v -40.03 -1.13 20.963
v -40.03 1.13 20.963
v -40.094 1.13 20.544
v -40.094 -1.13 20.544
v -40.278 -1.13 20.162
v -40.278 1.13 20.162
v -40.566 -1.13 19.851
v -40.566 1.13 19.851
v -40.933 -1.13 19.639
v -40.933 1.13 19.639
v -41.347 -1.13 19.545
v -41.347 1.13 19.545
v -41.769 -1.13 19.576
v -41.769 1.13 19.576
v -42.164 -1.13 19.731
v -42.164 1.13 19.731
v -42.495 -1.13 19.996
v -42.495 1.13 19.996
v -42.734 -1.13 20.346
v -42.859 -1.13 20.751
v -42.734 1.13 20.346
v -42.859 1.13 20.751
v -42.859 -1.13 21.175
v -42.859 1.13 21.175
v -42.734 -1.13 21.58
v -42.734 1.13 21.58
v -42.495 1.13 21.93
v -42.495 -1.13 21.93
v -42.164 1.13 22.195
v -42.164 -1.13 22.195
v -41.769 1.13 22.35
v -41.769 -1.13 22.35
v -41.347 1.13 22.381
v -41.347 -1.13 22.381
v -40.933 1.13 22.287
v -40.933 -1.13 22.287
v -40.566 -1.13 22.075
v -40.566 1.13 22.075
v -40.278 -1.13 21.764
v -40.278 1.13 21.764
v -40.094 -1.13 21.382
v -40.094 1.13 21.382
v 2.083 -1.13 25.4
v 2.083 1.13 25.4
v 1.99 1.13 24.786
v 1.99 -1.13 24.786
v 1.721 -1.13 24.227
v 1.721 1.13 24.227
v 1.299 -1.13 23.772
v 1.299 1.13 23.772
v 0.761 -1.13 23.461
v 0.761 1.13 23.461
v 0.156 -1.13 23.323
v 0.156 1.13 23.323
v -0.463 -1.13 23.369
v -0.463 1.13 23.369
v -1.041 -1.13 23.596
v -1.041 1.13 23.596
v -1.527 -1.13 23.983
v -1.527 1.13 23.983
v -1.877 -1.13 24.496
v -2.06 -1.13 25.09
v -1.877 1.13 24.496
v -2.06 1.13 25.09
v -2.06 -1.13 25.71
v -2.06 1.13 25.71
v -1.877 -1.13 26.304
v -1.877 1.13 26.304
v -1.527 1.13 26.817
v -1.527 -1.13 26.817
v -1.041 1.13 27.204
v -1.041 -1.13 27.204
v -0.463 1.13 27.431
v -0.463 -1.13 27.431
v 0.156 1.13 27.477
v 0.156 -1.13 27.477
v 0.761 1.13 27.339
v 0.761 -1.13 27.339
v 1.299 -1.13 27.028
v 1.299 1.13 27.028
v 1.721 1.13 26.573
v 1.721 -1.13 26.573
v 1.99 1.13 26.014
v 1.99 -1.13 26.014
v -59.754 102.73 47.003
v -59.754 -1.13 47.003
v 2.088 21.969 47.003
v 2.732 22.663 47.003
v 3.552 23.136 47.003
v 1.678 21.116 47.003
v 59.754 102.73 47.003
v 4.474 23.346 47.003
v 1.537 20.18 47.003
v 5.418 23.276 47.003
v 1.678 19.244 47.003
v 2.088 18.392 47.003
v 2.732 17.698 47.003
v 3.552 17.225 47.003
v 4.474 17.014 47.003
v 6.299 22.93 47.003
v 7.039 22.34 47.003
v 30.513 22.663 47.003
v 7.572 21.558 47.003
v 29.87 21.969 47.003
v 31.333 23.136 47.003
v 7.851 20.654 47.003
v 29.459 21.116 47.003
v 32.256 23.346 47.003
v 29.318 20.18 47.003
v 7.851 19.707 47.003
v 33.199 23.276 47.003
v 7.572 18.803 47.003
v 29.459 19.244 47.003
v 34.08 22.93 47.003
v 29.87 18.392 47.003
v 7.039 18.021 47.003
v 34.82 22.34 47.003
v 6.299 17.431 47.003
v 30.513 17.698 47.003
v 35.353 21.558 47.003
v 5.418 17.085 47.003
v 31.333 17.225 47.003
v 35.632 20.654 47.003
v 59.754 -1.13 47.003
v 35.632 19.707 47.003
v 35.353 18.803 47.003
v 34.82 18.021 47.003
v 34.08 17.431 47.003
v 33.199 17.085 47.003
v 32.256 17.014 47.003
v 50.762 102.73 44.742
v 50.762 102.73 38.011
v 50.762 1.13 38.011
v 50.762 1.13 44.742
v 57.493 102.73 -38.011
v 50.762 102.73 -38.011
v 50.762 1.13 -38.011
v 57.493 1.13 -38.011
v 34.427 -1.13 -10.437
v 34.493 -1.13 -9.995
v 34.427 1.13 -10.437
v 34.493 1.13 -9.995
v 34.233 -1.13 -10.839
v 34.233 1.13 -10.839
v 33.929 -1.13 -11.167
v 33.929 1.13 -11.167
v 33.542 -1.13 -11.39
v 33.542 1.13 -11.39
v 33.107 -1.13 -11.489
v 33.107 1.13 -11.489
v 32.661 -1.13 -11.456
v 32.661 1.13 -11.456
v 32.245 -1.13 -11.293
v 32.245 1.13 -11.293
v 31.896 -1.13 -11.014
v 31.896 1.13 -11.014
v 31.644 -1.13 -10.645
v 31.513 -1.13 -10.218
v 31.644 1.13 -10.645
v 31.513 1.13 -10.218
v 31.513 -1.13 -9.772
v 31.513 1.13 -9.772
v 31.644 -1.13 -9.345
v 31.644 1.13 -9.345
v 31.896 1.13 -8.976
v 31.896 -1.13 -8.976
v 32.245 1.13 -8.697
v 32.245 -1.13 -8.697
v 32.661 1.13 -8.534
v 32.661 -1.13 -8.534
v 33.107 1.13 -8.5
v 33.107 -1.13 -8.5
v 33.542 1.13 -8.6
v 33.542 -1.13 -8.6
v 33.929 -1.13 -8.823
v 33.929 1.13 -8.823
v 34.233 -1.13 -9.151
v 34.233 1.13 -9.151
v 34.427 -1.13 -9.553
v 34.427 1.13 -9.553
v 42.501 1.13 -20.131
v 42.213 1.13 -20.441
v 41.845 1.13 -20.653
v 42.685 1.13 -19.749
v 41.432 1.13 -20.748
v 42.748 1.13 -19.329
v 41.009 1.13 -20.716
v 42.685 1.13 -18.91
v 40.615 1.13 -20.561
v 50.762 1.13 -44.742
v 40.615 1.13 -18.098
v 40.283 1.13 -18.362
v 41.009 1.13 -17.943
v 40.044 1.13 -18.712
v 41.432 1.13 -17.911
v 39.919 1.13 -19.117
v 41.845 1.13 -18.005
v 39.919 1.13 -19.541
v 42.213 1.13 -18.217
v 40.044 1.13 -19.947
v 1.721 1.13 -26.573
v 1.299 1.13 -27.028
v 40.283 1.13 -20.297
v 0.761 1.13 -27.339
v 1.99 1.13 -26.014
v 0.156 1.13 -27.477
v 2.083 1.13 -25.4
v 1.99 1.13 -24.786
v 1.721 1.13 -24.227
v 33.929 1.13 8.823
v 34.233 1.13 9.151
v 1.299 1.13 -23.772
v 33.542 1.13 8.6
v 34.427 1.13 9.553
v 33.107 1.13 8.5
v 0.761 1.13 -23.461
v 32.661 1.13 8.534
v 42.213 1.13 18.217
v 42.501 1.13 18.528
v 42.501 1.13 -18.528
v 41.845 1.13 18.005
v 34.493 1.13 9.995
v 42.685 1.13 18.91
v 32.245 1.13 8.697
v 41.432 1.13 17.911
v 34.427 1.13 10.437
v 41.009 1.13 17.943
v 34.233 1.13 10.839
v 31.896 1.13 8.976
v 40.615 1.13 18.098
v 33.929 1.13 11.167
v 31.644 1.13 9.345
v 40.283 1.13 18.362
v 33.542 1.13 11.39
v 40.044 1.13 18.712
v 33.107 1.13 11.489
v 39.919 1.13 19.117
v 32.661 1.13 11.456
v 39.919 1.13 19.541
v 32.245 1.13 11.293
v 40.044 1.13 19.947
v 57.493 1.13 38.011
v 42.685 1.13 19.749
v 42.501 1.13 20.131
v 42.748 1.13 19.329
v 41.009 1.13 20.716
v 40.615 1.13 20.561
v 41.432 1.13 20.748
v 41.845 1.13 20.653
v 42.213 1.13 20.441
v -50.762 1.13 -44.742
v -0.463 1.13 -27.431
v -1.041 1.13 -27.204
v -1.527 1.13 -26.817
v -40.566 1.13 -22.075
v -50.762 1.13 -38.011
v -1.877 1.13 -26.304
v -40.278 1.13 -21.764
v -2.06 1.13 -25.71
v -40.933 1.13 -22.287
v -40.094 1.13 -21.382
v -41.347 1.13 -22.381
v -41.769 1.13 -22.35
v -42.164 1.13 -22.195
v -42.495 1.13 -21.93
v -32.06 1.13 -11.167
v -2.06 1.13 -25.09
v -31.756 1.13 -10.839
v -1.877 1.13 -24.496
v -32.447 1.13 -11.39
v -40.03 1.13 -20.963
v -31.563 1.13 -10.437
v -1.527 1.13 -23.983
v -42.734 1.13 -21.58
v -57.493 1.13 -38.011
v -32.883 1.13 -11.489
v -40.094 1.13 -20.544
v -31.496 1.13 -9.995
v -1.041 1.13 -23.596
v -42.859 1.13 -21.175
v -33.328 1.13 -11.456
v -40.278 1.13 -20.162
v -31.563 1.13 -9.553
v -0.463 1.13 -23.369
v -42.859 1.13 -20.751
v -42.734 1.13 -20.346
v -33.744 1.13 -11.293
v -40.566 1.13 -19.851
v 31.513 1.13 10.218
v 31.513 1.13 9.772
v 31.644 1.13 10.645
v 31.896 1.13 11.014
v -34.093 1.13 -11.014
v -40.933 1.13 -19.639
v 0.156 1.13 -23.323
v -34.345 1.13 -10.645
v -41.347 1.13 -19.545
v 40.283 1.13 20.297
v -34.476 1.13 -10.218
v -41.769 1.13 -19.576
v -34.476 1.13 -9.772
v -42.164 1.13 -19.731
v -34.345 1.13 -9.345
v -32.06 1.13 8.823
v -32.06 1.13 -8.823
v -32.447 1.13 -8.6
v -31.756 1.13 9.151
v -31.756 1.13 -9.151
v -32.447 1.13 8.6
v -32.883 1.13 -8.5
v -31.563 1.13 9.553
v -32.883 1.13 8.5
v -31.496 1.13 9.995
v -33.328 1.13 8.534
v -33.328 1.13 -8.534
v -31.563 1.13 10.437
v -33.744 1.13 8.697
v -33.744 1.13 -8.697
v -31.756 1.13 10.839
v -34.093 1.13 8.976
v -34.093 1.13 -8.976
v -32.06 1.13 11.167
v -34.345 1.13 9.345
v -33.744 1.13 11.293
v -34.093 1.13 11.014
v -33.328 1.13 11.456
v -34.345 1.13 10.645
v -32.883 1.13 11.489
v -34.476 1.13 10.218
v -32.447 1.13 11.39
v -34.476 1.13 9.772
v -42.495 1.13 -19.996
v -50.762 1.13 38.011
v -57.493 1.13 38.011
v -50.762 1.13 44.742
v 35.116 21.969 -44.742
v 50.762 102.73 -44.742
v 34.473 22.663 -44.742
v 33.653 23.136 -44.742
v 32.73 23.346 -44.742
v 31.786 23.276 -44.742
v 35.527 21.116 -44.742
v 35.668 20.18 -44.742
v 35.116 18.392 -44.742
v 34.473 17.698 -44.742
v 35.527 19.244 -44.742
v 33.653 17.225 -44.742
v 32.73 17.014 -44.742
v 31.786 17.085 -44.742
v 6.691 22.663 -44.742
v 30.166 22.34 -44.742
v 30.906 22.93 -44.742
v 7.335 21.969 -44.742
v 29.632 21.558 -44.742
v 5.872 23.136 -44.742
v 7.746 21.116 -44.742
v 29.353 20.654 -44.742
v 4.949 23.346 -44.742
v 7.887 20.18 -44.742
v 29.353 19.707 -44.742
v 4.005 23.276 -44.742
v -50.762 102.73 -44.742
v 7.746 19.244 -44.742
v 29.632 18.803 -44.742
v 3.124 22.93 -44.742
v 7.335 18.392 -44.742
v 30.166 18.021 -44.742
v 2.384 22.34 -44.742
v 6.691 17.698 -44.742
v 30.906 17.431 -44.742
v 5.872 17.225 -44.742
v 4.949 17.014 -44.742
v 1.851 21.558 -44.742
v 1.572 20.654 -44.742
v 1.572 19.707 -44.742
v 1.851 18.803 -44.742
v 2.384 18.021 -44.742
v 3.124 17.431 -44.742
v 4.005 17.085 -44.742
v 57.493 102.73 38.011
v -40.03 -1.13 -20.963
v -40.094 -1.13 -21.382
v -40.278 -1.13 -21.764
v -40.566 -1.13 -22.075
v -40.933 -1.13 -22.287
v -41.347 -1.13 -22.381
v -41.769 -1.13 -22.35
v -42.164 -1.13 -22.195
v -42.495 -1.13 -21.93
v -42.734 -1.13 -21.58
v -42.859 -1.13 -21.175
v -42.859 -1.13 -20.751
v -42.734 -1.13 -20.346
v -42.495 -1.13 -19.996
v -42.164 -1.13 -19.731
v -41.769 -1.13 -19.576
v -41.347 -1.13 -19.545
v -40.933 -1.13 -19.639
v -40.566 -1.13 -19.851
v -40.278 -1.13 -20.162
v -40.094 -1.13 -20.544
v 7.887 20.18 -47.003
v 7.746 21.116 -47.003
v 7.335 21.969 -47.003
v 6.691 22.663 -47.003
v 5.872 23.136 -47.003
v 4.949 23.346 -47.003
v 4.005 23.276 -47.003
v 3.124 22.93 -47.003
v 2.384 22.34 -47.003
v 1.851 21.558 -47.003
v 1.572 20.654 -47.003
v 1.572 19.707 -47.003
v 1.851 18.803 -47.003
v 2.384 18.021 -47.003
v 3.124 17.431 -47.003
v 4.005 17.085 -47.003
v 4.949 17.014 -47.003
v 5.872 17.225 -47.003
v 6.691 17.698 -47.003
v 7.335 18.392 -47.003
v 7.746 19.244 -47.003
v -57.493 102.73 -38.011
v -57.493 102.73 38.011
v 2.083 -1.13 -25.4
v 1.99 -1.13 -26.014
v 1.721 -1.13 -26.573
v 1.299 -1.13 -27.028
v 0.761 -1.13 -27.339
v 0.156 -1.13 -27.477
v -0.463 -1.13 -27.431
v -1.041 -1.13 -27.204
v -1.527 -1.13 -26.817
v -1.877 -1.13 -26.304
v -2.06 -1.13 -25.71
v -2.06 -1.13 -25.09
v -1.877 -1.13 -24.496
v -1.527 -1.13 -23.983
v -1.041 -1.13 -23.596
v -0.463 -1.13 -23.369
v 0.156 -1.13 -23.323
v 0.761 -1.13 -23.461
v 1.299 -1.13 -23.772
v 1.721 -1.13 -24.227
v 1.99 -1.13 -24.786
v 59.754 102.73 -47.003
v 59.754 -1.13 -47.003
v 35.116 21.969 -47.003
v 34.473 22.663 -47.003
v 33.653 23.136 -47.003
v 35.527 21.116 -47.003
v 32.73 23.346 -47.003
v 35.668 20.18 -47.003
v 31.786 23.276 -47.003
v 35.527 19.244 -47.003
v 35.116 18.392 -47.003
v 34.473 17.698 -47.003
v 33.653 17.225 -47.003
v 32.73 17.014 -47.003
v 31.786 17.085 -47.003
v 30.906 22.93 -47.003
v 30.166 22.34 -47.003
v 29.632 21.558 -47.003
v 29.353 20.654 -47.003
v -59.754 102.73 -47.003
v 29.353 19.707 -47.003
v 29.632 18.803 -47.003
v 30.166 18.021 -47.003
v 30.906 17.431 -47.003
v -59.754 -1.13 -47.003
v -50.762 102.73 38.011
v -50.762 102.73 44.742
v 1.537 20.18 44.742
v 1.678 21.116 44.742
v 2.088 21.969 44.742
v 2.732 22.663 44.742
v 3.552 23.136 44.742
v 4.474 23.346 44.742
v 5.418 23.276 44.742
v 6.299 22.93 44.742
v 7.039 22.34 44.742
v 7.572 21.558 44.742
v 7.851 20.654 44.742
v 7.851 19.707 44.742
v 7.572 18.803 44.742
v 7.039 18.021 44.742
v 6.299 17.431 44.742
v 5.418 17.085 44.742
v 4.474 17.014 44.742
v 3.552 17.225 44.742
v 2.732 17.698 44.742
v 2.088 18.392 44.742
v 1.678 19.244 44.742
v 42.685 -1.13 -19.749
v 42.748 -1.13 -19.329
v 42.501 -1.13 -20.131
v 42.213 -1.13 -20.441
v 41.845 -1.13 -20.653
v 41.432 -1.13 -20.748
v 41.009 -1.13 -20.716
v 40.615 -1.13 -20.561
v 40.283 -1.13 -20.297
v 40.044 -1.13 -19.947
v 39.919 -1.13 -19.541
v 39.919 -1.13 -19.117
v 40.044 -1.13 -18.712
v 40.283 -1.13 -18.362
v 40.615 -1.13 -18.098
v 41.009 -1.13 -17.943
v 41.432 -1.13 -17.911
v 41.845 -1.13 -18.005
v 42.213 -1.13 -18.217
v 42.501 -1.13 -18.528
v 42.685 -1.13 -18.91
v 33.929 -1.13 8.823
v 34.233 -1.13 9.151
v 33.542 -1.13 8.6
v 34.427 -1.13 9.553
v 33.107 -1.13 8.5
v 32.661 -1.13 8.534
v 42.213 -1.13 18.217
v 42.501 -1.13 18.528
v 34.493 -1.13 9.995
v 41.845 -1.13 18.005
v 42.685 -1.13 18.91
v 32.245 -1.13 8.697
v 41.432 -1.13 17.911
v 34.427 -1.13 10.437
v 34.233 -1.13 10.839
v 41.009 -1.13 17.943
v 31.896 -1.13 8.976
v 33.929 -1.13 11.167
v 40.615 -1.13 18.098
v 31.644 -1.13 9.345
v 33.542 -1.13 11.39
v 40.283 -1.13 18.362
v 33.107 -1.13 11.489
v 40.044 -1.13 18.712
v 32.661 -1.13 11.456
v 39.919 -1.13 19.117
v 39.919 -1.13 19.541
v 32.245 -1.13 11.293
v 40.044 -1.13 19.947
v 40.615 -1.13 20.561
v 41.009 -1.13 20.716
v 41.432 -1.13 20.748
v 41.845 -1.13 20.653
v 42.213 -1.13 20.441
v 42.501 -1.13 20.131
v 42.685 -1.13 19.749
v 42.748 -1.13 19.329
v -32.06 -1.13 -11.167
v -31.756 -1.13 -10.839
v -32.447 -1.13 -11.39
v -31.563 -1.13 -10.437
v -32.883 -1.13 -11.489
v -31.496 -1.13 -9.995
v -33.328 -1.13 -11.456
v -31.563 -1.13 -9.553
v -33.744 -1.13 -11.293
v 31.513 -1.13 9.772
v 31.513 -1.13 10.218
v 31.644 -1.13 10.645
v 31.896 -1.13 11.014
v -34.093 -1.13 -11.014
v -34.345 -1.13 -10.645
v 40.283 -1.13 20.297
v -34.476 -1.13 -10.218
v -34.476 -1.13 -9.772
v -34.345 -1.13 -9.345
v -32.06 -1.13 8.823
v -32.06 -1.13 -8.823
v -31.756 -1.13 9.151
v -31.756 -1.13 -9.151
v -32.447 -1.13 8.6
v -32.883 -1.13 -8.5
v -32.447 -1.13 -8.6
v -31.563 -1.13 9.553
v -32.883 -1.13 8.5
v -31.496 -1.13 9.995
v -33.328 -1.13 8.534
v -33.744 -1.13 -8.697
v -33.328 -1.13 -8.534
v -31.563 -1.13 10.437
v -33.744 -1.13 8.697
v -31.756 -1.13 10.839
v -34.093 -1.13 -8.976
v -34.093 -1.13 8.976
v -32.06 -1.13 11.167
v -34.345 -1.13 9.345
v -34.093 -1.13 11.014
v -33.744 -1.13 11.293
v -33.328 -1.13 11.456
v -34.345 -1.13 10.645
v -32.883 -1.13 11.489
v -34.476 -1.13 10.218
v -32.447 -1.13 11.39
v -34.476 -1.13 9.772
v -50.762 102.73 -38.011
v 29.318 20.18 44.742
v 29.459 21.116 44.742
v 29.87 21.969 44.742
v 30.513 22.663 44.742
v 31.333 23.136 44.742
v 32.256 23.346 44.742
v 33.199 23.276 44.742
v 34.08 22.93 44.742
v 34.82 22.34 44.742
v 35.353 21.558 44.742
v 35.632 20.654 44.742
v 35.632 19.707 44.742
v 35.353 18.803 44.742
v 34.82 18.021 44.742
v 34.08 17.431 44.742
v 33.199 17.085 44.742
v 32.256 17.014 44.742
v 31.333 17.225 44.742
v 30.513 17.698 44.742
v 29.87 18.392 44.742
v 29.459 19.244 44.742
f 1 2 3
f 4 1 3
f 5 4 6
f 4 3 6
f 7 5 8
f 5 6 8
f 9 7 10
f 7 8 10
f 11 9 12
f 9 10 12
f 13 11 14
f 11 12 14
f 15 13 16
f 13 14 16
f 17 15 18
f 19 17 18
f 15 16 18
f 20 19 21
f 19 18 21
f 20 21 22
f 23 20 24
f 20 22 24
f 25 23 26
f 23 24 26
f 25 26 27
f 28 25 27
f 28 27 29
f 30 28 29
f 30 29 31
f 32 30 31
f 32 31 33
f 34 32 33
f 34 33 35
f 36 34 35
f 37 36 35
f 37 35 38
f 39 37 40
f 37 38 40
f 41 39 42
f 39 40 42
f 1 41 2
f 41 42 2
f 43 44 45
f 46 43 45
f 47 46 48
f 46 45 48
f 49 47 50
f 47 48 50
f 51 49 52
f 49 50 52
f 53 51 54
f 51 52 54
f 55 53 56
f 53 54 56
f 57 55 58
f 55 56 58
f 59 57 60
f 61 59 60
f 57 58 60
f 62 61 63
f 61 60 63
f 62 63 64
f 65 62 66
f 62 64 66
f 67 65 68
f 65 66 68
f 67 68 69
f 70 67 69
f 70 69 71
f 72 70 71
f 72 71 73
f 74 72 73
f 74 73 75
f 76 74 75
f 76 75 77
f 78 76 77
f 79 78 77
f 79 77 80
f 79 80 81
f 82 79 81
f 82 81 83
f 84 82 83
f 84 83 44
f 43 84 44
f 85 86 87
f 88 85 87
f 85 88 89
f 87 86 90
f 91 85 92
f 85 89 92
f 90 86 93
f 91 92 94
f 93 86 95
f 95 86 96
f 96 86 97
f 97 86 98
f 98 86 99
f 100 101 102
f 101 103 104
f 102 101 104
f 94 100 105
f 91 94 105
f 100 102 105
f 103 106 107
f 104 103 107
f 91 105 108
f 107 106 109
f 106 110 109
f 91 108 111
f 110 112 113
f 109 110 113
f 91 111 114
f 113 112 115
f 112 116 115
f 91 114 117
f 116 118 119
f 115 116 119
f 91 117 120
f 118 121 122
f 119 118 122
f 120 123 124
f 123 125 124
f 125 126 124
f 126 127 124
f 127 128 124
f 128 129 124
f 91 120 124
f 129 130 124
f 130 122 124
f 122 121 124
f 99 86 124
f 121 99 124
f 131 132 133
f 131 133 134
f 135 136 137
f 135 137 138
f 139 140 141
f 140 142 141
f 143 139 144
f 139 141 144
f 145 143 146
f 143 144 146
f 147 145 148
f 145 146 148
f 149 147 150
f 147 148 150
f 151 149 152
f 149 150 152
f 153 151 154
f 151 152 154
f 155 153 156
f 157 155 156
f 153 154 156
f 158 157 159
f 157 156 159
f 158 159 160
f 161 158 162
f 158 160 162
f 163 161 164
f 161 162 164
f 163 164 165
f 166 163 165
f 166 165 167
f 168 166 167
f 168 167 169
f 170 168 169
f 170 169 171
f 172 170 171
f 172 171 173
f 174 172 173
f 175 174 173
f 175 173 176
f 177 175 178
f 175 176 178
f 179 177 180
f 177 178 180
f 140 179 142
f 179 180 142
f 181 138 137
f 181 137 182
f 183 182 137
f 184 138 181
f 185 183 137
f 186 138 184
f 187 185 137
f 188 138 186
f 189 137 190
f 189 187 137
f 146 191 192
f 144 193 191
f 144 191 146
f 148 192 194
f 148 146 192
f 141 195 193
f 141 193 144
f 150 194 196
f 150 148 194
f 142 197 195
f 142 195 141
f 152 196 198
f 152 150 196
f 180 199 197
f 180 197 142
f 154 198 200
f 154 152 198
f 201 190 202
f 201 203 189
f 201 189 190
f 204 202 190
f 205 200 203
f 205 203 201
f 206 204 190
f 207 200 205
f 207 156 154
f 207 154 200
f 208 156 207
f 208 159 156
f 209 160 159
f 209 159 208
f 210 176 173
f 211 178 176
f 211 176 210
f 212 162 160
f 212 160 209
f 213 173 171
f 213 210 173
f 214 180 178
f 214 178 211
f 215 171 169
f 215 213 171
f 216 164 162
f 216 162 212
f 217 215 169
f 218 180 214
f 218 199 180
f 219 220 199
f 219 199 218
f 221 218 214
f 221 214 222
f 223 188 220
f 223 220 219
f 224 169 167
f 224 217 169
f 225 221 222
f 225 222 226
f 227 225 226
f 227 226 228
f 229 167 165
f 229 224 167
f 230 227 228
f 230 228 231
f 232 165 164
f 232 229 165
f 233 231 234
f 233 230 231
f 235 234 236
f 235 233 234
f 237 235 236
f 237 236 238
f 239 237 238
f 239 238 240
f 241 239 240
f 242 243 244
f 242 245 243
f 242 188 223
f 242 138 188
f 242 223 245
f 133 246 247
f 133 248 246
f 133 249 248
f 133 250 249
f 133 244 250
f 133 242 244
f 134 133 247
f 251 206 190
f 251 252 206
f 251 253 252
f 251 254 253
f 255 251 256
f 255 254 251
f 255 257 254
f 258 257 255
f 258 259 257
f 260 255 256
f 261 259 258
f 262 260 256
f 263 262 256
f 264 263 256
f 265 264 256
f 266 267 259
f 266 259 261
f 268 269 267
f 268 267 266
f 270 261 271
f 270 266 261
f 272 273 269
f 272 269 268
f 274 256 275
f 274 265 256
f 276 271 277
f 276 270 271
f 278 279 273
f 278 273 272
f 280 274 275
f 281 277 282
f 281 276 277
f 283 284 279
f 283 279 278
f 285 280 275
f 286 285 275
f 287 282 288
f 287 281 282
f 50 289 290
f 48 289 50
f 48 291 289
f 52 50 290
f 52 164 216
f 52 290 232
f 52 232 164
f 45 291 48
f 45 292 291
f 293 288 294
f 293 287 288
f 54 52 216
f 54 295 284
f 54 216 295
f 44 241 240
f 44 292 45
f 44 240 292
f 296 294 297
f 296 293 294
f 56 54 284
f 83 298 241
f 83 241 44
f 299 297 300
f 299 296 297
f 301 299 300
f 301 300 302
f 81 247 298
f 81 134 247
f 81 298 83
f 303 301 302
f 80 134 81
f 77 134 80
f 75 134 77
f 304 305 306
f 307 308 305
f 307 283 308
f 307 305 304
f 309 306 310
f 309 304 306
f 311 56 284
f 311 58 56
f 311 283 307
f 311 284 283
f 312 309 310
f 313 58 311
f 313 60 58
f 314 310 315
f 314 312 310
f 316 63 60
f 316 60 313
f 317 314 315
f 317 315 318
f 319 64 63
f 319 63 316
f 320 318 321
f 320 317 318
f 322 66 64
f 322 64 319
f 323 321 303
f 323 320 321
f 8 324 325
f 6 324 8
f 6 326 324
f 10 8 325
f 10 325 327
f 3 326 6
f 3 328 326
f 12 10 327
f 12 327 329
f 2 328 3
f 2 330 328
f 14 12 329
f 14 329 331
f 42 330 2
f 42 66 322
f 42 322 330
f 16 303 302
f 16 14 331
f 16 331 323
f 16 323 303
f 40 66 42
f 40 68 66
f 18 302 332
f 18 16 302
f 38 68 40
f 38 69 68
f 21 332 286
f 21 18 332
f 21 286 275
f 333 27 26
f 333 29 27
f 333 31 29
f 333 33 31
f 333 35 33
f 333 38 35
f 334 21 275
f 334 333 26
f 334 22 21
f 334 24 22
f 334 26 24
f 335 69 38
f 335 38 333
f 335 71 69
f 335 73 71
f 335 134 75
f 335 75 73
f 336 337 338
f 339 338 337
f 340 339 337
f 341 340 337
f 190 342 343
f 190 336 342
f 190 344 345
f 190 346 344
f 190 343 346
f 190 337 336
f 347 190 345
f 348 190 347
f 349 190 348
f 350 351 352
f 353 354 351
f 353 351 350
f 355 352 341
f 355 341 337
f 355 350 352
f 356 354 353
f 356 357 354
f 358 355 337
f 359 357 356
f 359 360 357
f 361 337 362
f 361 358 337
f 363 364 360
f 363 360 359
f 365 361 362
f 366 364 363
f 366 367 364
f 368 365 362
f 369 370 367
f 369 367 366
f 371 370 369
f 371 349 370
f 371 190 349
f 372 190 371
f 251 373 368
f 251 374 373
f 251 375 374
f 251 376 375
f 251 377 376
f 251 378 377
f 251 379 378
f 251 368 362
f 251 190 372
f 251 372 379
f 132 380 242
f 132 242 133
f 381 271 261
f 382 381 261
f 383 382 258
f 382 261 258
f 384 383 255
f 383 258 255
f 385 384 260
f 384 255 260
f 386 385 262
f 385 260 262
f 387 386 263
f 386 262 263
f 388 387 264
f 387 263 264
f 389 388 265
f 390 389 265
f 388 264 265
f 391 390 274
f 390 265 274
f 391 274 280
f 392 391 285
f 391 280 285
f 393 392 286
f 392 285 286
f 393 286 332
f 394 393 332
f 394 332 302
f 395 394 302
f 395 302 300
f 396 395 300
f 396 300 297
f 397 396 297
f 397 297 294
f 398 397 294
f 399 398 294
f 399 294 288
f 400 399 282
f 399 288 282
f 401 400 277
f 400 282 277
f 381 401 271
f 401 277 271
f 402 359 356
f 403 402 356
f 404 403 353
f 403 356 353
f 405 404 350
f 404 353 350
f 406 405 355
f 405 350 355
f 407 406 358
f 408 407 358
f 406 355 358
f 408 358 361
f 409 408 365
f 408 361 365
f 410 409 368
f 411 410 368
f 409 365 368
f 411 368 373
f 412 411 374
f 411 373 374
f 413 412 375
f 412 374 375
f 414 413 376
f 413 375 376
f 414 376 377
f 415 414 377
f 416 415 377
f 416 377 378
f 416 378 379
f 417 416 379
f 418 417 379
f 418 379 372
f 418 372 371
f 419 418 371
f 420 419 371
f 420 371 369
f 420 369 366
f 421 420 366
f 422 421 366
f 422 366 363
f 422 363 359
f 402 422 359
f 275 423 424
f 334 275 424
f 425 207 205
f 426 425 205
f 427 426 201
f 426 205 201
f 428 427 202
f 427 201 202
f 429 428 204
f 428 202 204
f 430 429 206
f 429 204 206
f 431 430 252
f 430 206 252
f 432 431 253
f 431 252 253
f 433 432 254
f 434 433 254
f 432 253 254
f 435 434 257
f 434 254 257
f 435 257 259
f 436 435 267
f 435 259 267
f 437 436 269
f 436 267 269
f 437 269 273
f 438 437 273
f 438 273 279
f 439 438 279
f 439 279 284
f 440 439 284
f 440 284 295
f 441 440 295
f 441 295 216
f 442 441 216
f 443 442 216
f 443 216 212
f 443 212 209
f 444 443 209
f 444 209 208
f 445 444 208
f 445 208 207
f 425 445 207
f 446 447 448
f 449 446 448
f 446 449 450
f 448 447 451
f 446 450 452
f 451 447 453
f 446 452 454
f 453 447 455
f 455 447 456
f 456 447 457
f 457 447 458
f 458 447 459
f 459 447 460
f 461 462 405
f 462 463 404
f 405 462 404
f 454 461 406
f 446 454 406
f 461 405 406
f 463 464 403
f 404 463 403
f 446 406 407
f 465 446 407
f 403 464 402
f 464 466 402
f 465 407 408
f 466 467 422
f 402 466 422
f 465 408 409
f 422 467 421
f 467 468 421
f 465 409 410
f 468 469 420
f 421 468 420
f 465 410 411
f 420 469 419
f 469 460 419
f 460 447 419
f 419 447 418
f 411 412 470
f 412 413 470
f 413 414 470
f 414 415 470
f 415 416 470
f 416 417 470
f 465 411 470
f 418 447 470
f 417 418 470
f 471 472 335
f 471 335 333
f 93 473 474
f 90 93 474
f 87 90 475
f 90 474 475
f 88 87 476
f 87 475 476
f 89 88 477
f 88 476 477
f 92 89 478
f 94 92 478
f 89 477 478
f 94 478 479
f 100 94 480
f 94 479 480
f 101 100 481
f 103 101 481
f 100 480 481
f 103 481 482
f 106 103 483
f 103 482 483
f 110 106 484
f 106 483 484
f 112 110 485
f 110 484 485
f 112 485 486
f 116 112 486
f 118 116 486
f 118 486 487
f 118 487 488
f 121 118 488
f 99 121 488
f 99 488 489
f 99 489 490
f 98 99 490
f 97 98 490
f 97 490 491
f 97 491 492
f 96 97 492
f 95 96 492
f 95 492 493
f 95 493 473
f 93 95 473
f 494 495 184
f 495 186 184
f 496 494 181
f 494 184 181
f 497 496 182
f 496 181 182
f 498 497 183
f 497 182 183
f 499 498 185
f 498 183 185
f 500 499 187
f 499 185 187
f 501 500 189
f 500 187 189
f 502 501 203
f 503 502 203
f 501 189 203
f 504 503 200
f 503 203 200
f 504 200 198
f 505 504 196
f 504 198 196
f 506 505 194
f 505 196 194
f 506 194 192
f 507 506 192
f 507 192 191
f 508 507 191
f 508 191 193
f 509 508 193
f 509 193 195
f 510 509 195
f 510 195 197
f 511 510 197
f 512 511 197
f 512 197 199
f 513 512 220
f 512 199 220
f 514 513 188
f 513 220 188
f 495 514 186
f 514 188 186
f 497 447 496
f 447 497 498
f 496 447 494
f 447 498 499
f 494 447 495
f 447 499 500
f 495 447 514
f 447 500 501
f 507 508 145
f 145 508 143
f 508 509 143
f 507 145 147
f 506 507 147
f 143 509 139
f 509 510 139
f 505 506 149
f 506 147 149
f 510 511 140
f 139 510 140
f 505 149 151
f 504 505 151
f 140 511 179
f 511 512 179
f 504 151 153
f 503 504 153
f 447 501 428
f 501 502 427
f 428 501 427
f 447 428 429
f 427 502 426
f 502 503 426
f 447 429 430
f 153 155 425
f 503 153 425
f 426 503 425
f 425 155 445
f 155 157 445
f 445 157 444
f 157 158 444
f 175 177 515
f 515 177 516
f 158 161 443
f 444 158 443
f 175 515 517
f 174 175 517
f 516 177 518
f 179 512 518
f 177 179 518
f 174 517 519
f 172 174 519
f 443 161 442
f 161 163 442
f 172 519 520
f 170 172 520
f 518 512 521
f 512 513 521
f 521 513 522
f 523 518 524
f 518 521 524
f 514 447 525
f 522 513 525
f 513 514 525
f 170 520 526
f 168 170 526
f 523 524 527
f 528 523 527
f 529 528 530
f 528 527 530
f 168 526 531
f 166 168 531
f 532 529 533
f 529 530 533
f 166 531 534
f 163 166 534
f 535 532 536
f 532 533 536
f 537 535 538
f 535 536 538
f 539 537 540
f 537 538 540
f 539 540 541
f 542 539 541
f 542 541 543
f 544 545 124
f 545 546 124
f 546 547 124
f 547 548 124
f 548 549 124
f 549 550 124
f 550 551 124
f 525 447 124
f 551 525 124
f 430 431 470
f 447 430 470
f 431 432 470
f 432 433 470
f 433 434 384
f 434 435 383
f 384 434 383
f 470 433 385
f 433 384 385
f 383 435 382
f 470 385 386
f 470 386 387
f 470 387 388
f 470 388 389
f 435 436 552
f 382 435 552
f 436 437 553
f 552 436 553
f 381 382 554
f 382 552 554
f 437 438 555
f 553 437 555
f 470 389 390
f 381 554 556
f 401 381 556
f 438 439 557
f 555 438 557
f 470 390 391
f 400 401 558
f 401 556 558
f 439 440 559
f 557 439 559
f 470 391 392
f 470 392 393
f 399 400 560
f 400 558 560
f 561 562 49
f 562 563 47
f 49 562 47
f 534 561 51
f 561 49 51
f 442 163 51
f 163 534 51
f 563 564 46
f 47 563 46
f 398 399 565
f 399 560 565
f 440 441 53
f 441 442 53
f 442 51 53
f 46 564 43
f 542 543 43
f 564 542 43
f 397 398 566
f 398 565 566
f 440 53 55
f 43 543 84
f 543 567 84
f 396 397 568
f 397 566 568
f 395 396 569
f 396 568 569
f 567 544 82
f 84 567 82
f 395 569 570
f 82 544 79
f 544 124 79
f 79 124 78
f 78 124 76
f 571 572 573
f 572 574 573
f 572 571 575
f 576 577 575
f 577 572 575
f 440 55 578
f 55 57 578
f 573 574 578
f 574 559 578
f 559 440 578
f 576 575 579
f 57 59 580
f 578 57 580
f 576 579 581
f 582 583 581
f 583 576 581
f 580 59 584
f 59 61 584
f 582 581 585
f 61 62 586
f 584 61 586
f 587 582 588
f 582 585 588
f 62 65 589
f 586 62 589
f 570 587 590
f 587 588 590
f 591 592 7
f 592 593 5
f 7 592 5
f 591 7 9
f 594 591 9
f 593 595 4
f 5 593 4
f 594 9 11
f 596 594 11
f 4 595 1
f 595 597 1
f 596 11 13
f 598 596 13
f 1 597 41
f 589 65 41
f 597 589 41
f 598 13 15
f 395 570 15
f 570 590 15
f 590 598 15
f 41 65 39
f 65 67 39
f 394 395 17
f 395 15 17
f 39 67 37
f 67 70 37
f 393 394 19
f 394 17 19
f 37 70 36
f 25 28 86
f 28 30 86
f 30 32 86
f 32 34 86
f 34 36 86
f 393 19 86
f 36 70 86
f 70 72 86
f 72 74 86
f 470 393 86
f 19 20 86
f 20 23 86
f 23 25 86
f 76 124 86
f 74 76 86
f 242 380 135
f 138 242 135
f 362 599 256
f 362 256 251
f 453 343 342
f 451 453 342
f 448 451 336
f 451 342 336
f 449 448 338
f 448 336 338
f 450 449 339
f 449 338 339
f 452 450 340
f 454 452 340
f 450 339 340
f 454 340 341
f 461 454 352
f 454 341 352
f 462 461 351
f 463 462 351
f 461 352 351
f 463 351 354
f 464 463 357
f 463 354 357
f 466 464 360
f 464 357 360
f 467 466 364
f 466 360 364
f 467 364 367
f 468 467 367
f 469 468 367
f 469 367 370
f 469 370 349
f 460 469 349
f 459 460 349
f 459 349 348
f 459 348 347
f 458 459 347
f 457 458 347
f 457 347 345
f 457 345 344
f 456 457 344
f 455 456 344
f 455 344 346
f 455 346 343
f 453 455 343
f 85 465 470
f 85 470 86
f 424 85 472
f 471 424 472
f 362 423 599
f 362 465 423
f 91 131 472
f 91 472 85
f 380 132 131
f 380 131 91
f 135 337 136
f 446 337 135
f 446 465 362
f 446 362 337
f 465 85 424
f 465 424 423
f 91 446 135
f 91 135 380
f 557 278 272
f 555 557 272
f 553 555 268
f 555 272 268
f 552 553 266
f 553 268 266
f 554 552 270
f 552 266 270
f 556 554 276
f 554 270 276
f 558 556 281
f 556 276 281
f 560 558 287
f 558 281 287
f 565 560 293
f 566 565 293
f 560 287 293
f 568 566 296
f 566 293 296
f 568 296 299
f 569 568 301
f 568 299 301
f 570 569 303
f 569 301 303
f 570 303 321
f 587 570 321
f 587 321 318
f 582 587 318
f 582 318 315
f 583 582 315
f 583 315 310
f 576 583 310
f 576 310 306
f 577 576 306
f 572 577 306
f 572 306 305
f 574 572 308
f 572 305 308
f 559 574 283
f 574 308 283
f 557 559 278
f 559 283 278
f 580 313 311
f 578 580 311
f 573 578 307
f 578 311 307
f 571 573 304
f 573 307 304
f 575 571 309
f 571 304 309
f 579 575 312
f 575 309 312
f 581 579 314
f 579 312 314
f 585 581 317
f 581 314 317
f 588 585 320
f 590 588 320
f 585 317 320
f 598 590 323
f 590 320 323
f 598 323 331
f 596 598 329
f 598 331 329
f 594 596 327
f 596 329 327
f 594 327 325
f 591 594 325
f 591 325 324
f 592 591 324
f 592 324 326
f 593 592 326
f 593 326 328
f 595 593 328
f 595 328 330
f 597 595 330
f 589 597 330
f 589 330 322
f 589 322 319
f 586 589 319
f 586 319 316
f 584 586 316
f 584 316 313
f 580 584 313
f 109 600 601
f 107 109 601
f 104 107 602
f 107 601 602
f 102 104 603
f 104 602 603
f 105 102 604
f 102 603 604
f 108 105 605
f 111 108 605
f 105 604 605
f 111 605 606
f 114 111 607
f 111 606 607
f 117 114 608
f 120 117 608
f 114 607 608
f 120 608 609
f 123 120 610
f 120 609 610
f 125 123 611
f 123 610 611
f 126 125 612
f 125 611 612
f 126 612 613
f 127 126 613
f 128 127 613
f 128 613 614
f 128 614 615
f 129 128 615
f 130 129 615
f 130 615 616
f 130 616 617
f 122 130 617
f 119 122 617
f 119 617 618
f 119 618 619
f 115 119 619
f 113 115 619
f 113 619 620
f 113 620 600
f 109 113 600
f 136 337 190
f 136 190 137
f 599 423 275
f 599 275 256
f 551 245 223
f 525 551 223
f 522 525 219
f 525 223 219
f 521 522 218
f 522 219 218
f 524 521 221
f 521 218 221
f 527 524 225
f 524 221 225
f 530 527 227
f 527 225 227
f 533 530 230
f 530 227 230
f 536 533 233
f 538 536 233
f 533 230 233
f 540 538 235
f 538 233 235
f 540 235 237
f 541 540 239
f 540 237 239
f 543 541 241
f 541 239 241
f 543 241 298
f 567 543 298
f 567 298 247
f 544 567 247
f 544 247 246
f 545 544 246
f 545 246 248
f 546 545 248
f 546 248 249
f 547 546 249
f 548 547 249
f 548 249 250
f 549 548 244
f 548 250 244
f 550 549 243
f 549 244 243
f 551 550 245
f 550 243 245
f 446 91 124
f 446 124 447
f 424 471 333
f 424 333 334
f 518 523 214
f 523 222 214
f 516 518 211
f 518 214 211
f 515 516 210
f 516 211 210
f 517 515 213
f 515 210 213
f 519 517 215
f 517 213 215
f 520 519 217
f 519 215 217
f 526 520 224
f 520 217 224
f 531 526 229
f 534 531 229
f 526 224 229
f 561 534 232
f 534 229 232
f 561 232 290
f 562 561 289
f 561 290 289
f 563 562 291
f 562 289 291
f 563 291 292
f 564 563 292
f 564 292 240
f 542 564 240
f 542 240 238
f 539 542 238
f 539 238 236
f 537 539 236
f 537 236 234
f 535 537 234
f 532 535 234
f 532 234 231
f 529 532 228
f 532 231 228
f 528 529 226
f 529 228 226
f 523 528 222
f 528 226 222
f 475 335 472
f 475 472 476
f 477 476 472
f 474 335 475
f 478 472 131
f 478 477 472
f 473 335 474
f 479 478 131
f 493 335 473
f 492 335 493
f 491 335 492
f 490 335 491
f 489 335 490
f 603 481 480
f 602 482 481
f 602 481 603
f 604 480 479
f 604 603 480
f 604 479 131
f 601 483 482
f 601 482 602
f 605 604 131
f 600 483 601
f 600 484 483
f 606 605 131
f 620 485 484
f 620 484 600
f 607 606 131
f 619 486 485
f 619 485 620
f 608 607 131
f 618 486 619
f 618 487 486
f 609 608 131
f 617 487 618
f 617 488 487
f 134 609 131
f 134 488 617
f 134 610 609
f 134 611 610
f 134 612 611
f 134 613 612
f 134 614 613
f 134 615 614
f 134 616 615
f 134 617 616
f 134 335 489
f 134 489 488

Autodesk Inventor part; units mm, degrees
ref_plane "YZ Plane" through (0, 0, 0) normal (1, 0, 0) x (0, 1, 0)
ref_plane "XZ Plane" through (0, 0, 0) normal (0, 1, 0) x (-1, 0, 0)
ref_plane "XY Plane" through (0, 0, 0) normal (0, 0, 1) x (1, 0, 0)
sketch "Sketch1" plane through (0, 0, 0) normal (0, 1, 0) x (-1, 0, 0)
  line L0 (-59.7535, -47.0027) -> (59.7535, -47.0027)
  line L1 (59.7535, -47.0027) -> (59.7535, 47.0027)
  line L2 (59.7535, 47.0027) -> (-59.7535, 47.0027)
  line L3 (-59.7535, 47.0027) -> (-59.7535, -47.0027)
  line L4 (-59.7535, -47.0027) -> (59.7535, 47.0027) construction
  line L5 (59.7535, -47.0027) -> (-59.7535, 47.0027) construction
  point P0 (0, 0)
  dimension "d0" = 119.507
  dimension "d1" = 94.0054
extrude "Extrusion1" add sketch "Sketch1" along normal mid plane 2.2606
sketch "Sketch2" plane through (0, 1.1303, 0) normal (0, 1, 0) x (1, 0, 0)
  line L0 (-59.7535, 47.0027) -> (-59.7535, -47.0027) projected
  line L1 (59.7535, -47.0027) -> (59.7535, 47.0027) projected
  line L2 (-59.7535, -47.0027) -> (59.7535, -47.0027)
  line L3 (59.7535, -47.0027) -> (59.7535, 47.0027)
  line L4 (59.7535, 47.0027) -> (-59.7535, 47.0027)
  line L5 (-59.7535, 47.0027) -> (-59.7535, -47.0027)
  line L6 (57.4929, -44.7421) -> (-57.4929, 44.7421) construction
  line L7 (-57.4929, -44.7421) -> (57.4929, 44.7421) construction
  line L8 (-59.7535, -47.0027) -> (59.7535, -47.0027) projected
  line L9 (-59.7535, -47.0027) -> (-50.7619, -47.0027)
  line L10 (-59.7535, -38.0111) -> (-59.7535, -47.0027)
  line L11 (-59.7535, 47.0027) -> (-50.7619, 47.0027)
  line L12 (-59.7535, 38.0111) -> (-59.7535, 47.0027)
  line L13 (59.7535, 47.0027) -> (-59.7535, 47.0027) projected
  line L14 (59.7535, 47.0027) -> (50.7619, 47.0027)
  line L15 (59.7535, 38.0111) -> (59.7535, 47.0027)
  line L16 (59.7535, -47.0027) -> (50.7619, -47.0027)
  line L17 (59.7535, -38.0111) -> (59.7535, -47.0027)
  line L18 (-50.7619, -44.7421) -> (-50.7619, -38.0111)
  line L19 (-50.7619, -38.0111) -> (-57.4929, -38.0111)
  line L20 (-57.4929, 38.0111) -> (-50.7619, 38.0111)
  line L21 (-50.7619, 38.0111) -> (-50.7619, 44.7421)
  line L22 (50.7619, 38.0111) -> (57.4929, 38.0111)
  line L23 (50.7619, 44.7421) -> (50.7619, 38.0111)
  line L24 (57.4929, -38.0111) -> (50.7619, -38.0111)
  line L25 (50.7619, -38.0111) -> (50.7619, -44.7421)
  line L26 (-50.7619, -44.7421) -> (50.7619, -44.7421)
  line L27 (57.4929, -38.0111) -> (57.4929, 38.0111)
  line L28 (50.7619, 44.7421) -> (-50.7619, 44.7421)
  line L29 (-57.4929, 38.0111) -> (-57.4929, -38.0111)
  point P0 (0, 0)
  dimension "d4" = 114.9858
  dimension "d5" = 89.4842
  dimension "d6" = 8.9916
  dimension "d7" = 8.9916
  dimension "d10" = 8.9916
  dimension "d11" = 8.9916
extrude "Extrusion2" add sketch "Sketch2" along normal blind 101.6
sketch "Sketch3" plane through (0, 1.1303, 0) normal (0, 1, 0) x (1, 0, 0)
  circle A0 centre (0, -25.4) radius 2.0828
  circle A1 centre (0, 25.4) radius 2.0828
  point P0 (0, 0)
  dimension "d18" = 4.1656
  dimension "d19" = 4.1656
extrude "Extrusion3" cut sketch "Sketch3" against normal through all
sketch "Sketch7" plane through (0, 1.1303, 0) normal (0, 1, 0) x (1, 0, 0)
  line L0 (44.6278, -24.4983) -> (-44.6278, 24.4983) construction
  line L1 (-44.6278, -24.4983) -> (44.6278, 24.4983) construction
  line L2 (44.5008, -22.5044) -> (-44.5008, 22.5044) construction
  line L3 (-44.5008, -22.5044) -> (44.5008, 22.5044) construction
  circle A0 centre (41.3258, -19.3294) radius 1.4224
  circle A1 centre (41.3258, 19.3294) radius 1.4224
  circle A2 centre (-41.4528, 20.963) radius 1.4224
  circle A3 centre (-41.4528, -20.963) radius 1.4224
  line L4 (32.9946, -9.9949) -> (-32.9946, 9.9949) construction
  line L5 (-32.9946, -9.9949) -> (32.9946, 9.9949) construction
  circle A4 centre (-32.9946, -9.9949) radius 1.4986
  circle A5 centre (-32.9946, 9.9949) radius 1.4986
  circle A6 centre (32.9946, 9.9949) radius 1.4986
  circle A7 centre (32.9946, -9.9949) radius 1.4986
  point P0 (0, 0)
  point P1 (0, 0)
  dimension "d57" = 2.8448
  dimension "d58" = 2.8448
  dimension "d59" = 2.8448
  dimension "d60" = 2.8448
  dimension "d61" = 65.9892
  dimension "d62" = 19.9898
  dimension "d63" = 2.9972
  dimension "d64" = 2.9972
  dimension "d65" = 2.9972
  dimension "d66" = 2.9972
extrude "Extrusion6" cut sketch "Sketch7" against normal through all
sketch "Sketch8" plane through (-50.7619, 1.1303, -44.7421) normal (0, 0, 1) x (1, 0, 0)
  circle A0 centre (55.4736, 19.05) radius 3.175
  circle A1 centre (83.2549, 19.05) radius 3.175
  point P0 (50.7619, -1.1303)
  dimension "d71" = 6.35
  dimension "d72" = 6.35
extrude "Extrusion7" cut sketch "Sketch8" against normal through all
sketch "Sketch9" plane through (50.7619, 1.1303, 44.7421) normal (0, 0, -1) x (-1, 0, 0)
  line L0 (101.5238, 0) -> (101.5238, 101.6) projected
  circle A0 centre (18.269, 19.05) radius 3.175
  circle A1 centre (46.0502, 19.05) radius 3.175
  point P0 (50.7619, -1.1303)
  dimension "d79" = 6.35
  dimension "d80" = 6.35
extrude "Extrusion8" cut sketch "Sketch9" against normal through all
properties part number "546-1590BBS-PE4312"
